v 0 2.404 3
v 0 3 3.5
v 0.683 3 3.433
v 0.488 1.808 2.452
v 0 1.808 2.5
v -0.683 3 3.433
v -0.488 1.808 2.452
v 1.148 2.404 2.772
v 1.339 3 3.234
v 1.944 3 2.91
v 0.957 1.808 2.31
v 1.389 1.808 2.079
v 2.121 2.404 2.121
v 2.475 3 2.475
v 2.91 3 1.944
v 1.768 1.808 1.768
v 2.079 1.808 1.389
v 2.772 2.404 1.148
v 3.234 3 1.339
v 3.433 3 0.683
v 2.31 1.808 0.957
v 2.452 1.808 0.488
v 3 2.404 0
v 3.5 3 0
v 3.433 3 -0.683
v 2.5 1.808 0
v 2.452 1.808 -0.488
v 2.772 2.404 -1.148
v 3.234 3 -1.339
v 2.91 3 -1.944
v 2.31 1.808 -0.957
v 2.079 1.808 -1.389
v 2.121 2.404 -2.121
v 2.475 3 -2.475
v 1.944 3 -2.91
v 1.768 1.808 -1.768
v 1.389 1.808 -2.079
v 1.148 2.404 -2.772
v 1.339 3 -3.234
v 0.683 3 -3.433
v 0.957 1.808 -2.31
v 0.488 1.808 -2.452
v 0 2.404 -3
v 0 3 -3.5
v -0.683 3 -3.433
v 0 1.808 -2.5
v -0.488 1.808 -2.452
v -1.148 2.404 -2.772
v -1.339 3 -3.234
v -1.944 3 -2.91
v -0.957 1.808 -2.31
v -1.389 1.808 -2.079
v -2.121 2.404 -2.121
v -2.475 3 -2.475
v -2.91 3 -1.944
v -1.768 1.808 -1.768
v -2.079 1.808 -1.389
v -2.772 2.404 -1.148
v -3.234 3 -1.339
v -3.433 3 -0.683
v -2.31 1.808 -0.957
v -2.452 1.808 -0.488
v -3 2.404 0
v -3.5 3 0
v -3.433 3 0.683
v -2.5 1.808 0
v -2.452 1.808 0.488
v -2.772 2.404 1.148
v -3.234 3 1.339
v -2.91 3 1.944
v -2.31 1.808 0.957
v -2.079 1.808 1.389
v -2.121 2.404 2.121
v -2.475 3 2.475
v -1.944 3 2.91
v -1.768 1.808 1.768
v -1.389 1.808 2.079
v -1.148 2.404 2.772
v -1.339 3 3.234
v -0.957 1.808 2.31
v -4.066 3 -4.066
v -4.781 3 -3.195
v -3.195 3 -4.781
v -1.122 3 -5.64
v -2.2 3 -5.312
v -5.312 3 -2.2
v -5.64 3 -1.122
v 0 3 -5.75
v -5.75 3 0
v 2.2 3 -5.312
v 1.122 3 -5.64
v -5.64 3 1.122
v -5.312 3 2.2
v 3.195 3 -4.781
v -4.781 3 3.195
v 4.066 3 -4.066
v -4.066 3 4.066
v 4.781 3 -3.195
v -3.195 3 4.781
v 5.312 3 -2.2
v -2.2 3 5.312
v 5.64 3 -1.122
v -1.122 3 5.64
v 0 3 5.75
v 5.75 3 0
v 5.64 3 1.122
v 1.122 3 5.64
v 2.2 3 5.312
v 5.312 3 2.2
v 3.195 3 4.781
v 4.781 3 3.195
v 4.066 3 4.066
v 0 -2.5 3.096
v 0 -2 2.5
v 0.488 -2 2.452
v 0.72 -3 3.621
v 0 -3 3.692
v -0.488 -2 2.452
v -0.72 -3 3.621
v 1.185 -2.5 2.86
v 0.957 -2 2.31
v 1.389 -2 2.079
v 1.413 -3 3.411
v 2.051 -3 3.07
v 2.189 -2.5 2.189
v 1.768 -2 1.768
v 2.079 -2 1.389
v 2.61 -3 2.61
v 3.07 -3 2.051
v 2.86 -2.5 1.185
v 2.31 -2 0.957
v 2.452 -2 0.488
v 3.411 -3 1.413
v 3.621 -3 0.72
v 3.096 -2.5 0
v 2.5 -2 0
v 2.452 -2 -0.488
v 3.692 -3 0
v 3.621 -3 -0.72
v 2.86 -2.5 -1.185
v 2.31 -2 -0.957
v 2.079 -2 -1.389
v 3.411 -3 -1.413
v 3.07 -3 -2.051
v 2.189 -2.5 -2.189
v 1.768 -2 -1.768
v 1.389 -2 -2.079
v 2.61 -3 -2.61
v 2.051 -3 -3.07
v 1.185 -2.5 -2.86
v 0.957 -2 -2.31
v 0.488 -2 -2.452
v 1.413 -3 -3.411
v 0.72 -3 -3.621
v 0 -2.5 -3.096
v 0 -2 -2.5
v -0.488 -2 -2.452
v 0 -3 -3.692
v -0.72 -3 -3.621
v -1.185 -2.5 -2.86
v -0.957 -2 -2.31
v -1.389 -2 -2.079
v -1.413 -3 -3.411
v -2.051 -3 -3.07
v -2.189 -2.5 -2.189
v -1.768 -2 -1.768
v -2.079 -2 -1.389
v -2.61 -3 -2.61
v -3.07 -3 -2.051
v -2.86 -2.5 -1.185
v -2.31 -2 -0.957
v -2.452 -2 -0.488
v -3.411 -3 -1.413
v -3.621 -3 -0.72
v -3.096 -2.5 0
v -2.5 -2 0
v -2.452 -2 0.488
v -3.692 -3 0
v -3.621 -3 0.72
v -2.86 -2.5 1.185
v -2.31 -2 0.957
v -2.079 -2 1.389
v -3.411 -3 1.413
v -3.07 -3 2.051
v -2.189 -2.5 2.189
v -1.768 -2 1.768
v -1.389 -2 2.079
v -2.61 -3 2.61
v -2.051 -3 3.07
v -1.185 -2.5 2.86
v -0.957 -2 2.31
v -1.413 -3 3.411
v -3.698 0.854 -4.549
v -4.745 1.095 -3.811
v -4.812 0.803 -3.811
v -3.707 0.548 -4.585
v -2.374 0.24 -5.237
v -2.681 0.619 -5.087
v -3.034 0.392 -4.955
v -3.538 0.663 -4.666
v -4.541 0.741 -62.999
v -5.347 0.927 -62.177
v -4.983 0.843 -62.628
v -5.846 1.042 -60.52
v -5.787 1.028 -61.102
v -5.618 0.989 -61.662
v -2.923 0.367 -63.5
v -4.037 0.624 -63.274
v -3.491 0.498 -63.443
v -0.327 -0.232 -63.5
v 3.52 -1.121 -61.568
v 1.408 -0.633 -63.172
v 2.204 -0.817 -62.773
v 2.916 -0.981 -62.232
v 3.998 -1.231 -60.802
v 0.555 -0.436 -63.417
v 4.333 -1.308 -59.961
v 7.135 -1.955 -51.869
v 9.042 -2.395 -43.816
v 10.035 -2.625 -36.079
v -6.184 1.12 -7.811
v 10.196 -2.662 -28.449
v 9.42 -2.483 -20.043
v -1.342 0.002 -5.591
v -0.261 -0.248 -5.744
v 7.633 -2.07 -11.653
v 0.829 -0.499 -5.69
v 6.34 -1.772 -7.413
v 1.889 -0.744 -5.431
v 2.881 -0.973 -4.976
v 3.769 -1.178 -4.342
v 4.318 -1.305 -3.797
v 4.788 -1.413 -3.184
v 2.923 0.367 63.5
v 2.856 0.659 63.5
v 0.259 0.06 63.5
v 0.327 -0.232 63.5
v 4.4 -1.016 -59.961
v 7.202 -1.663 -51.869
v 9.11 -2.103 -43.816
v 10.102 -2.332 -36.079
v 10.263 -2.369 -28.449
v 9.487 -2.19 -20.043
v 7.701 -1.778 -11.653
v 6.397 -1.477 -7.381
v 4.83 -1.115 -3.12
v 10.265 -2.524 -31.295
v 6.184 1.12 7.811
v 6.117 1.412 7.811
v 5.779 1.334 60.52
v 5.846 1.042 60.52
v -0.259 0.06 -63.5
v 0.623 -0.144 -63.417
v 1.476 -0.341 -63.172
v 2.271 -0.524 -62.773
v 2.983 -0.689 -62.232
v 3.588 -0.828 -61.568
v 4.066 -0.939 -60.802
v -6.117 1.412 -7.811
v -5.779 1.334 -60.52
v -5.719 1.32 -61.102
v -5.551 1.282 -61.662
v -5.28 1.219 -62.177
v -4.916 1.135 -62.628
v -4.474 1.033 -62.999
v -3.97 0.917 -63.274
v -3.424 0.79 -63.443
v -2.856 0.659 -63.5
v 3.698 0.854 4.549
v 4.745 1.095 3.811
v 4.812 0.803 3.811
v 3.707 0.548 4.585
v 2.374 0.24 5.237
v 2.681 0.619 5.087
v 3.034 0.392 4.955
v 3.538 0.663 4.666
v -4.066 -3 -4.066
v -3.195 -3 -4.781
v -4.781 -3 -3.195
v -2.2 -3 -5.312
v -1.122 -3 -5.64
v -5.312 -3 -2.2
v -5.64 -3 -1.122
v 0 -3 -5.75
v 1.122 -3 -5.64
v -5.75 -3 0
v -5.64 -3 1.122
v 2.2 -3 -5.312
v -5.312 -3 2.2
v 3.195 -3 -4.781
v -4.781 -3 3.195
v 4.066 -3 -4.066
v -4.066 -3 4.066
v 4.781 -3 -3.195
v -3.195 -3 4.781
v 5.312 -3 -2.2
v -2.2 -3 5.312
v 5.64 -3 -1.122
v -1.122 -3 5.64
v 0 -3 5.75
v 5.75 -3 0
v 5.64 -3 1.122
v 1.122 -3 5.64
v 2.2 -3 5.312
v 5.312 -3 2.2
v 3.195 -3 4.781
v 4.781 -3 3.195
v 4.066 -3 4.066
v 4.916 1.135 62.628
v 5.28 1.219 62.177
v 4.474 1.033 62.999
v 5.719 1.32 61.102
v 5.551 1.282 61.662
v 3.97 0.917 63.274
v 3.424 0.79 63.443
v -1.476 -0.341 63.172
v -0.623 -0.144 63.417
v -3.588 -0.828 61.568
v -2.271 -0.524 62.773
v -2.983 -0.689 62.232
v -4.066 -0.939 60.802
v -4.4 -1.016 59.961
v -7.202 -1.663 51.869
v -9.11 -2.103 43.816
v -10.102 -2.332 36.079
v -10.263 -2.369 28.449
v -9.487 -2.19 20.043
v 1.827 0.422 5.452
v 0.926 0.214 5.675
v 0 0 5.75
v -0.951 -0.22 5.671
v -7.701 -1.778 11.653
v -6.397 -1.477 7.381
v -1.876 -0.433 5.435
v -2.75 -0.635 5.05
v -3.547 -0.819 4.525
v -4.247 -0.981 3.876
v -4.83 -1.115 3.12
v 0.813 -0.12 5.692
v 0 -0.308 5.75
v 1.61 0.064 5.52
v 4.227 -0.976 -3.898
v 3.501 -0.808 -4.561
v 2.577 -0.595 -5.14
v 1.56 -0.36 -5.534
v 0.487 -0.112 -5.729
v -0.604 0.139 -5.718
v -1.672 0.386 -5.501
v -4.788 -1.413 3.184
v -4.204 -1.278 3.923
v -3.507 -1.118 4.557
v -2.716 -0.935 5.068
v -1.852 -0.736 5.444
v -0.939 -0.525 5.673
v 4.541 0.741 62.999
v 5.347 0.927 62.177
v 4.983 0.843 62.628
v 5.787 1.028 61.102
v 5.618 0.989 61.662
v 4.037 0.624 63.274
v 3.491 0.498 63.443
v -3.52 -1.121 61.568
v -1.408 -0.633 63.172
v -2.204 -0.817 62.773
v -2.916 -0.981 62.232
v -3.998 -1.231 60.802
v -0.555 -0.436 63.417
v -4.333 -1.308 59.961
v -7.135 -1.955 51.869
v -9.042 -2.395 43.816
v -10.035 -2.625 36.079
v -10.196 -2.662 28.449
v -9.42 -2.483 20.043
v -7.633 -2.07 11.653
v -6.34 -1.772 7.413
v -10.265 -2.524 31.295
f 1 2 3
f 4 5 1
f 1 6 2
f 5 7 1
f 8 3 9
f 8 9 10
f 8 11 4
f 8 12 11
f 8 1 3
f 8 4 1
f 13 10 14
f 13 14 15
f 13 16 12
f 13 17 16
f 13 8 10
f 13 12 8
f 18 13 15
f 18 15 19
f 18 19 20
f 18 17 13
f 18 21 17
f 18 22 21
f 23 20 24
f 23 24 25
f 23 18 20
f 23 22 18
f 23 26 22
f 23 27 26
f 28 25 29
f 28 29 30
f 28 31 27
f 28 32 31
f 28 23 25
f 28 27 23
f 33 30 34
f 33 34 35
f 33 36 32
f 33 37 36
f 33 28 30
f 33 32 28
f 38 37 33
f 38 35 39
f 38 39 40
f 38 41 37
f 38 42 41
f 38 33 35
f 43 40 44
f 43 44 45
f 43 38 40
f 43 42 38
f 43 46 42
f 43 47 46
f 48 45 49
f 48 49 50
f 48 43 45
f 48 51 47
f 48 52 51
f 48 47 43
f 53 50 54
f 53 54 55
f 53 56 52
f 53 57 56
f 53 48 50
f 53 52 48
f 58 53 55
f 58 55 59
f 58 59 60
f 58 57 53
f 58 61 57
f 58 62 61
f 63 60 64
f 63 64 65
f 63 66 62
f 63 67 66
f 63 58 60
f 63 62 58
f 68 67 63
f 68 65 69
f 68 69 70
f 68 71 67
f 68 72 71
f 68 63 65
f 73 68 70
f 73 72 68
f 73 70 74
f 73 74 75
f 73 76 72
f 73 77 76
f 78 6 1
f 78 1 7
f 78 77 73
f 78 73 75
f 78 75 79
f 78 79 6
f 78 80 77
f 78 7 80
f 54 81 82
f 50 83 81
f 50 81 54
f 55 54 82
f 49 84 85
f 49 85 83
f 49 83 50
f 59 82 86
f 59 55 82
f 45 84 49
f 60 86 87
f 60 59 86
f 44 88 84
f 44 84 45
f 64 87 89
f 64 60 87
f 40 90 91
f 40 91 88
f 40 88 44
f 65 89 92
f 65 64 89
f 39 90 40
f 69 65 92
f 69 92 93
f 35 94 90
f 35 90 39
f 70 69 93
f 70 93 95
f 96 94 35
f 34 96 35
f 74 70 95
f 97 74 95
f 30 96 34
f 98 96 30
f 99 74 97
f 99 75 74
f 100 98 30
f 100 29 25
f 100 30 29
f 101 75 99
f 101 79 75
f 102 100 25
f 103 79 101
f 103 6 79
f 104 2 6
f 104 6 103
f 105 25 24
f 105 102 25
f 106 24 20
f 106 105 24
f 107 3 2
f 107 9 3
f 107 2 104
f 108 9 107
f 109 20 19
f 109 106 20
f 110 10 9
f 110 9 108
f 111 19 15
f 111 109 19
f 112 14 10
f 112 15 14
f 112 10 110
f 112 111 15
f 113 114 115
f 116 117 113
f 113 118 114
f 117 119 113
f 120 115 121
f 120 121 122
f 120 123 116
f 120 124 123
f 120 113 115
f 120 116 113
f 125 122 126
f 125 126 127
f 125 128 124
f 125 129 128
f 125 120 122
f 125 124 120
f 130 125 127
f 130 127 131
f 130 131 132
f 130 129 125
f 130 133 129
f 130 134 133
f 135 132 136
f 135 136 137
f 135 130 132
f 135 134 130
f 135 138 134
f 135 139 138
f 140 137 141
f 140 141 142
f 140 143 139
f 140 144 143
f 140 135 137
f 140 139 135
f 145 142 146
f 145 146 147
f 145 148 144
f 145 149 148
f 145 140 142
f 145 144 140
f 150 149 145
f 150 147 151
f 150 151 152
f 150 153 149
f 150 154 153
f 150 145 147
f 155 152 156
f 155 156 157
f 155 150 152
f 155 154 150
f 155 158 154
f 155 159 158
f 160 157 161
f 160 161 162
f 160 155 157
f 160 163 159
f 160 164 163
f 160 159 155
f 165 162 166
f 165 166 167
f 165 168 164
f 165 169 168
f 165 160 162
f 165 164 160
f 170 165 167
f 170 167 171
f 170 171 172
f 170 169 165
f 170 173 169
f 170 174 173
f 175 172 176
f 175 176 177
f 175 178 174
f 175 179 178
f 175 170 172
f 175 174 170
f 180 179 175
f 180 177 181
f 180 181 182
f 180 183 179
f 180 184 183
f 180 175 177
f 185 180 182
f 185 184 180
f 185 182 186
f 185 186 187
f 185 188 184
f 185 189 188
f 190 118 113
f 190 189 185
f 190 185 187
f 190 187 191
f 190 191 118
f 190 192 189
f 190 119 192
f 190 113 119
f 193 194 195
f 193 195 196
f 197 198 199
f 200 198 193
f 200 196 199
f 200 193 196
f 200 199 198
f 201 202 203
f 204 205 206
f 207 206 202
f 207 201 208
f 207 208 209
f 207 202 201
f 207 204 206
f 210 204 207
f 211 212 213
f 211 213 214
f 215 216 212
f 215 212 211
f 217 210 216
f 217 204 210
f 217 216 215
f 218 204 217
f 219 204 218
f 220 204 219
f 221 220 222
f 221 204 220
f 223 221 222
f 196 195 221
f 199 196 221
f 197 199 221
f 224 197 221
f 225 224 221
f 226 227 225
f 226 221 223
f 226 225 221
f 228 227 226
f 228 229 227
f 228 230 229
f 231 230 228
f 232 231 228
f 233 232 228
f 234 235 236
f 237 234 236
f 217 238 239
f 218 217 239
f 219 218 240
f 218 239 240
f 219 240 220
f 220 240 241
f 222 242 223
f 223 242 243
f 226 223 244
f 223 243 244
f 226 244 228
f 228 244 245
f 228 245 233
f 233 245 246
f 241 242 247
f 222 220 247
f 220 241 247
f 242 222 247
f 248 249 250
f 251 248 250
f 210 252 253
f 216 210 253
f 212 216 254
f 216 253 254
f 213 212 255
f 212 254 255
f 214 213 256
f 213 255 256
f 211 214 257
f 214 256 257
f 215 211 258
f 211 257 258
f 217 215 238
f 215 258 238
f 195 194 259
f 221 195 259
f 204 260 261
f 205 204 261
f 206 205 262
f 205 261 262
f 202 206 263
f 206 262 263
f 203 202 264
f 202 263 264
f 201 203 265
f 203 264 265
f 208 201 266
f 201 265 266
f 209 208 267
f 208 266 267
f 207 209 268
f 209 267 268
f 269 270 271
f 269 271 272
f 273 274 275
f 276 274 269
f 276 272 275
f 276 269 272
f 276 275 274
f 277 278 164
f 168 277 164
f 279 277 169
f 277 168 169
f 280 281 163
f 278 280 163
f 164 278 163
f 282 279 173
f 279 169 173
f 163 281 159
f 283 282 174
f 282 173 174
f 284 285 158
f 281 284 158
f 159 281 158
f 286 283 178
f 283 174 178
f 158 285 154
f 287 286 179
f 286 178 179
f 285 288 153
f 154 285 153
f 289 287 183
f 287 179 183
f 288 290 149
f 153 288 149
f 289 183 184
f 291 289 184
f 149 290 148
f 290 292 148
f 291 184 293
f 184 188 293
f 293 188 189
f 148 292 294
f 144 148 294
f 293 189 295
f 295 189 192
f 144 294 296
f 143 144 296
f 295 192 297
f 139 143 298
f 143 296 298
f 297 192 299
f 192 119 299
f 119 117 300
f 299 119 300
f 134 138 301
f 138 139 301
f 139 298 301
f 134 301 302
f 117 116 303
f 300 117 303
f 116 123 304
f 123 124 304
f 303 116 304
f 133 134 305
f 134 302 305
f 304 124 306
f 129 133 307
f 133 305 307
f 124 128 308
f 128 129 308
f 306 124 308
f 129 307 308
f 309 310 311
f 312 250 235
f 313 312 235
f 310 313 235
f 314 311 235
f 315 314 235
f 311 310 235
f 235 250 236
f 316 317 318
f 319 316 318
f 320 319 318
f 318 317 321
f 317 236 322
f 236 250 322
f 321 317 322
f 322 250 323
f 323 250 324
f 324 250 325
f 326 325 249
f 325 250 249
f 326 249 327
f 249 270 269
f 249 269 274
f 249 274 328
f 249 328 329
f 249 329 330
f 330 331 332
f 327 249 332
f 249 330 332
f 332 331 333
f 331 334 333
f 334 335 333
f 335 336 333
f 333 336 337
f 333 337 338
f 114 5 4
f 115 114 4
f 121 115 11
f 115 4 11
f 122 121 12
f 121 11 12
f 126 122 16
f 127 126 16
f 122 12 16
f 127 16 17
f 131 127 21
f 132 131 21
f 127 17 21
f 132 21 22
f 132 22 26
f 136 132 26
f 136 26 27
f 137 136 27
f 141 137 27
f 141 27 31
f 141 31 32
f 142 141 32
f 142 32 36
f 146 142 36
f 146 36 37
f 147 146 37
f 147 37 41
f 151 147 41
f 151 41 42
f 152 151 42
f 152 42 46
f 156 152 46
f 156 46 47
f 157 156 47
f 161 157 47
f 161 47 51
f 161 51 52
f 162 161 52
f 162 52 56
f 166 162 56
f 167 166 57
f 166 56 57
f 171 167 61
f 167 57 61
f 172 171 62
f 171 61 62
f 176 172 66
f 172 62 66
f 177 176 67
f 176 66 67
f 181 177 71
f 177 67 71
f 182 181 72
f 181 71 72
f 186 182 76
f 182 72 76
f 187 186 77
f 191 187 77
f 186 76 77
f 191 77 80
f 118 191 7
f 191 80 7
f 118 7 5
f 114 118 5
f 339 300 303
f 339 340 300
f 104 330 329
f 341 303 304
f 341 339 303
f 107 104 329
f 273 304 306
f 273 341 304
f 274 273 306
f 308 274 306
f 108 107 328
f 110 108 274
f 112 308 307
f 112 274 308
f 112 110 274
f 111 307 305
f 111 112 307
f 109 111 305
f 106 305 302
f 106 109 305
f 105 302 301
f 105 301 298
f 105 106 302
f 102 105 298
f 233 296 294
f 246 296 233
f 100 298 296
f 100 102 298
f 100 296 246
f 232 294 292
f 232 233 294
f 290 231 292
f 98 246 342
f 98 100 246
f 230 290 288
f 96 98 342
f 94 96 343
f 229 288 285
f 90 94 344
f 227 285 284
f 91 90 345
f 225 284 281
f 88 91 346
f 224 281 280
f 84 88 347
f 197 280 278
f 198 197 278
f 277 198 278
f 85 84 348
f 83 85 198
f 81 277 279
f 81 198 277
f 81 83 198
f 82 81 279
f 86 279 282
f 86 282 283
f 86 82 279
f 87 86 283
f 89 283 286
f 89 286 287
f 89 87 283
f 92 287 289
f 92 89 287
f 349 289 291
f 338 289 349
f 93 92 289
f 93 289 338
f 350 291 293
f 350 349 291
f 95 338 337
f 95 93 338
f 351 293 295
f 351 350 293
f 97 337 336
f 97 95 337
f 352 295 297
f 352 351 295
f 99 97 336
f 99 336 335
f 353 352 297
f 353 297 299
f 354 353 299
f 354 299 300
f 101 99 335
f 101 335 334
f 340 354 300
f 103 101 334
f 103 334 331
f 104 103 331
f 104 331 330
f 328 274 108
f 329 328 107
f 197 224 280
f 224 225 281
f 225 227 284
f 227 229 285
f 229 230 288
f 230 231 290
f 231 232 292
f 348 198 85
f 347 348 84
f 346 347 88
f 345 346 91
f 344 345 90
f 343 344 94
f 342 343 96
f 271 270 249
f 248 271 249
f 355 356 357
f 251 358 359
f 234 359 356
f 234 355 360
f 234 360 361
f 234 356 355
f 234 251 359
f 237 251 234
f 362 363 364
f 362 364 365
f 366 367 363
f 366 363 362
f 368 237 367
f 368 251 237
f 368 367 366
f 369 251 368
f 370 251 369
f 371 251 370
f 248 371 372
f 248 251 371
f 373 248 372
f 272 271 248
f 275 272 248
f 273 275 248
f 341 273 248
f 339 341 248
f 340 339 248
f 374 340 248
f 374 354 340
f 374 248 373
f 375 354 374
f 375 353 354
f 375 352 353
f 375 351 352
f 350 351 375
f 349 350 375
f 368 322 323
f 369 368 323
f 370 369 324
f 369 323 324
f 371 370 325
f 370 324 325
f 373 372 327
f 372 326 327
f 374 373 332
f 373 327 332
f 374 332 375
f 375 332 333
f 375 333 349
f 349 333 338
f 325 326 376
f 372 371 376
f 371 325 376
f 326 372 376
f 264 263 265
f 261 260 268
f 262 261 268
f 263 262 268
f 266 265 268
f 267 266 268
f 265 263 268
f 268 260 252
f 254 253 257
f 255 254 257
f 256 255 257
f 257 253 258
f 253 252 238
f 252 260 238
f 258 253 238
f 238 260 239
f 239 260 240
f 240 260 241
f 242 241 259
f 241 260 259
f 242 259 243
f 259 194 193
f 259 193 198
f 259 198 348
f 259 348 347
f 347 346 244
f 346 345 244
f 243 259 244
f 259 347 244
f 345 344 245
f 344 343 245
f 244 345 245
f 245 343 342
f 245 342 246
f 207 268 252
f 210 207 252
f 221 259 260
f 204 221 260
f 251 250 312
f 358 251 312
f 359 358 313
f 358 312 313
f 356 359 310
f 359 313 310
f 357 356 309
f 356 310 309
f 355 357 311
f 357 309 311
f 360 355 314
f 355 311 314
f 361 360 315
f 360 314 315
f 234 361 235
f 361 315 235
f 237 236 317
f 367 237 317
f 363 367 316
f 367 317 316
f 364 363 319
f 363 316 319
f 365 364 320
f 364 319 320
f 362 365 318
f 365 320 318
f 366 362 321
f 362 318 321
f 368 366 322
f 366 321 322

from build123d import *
from OCP.BRepFilletAPI import BRepFilletAPI_MakeChamfer

# Parameters (mm, degrees)
SKETCH1_R           = 5.75
BOSS_EXTRUDE1_DEPTH = 3
BOSS_EXTRUDE3_DEPTH = 0.3
CIRPATTERN1_COUNT   = 2
SKETCH4_R           = 2.5
CUT_EXTRUDE1_DEPTH  = 65.609278472
CHAMFER1_SIZE       = 1
CHAMFER1_SIZE2      = 1.191753593


with BuildPart() as part:
    # Sketch1 → Boss-Extrude1 (new, symmetric)
    with BuildSketch(Plane(origin=(0, 0, 0), x_dir=(1, 0, 0), z_dir=(0, 1, 0))):
        with Locations(Location((0, 0, 0), (0, 0, 270))):
            Circle(SKETCH1_R)
    extrude(amount=BOSS_EXTRUDE1_DEPTH, both=True)

    # Sketch3 → Boss-Extrude3 (add)
    with BuildSketch(Plane(origin=(0, 0, 0), x_dir=(0.9743700647852351, -0.22495105434386534, 0), z_dir=(-0.22495105434386534, -0.9743700647852351, 0))):
        with BuildLine():
            Line((-4.869810272, -3.811414063), (-6.277481036, -7.811414063))
            Line((-6.277481036, -7.811414063), (-5.9307932, -60.519732009))
            ThreePointArc((-5.9307932, -60.519732009), (-5.045190608, -62.628285228), (-2.930858092, -63.5))
            Line((-2.930858092, -63.5), (-0.266005483, -63.5))
            ThreePointArc((-0.266005483, -63.5), (2.708645134, -62.518887124), (4.515908541, -59.960581485))
            add(Edge.make_bspline(
                [(4.515908541, -59.960581485), (16.627834102, -30.503690424), (4.515908541, -2.064662287)],
                knots=[0, 0, 0, 1, 1, 1], degree=2))
            add(Edge.make_bspline(
                [(-4.869810272, -3.811414063), (0.634471784, -8.039563779), (4.515908541, -2.064662287)],
                knots=[0, 0, 0, 1, 1, 1], degree=2))
        make_face()
    boss_extrude3 = extrude(amount=BOSS_EXTRUDE3_DEPTH)

    # CirPattern1: Boss-Extrude3 ×2 about axis
    cirpattern1_axis = Axis((0, 3, 0), (0, -1, 0))
    for i in range(1, CIRPATTERN1_COUNT):
        add(boss_extrude3.rotate(cirpattern1_axis, i * 360 / CIRPATTERN1_COUNT))

    # Sketch4 → Cut-Extrude1 (cut, through all)
    with BuildSketch(Plane(origin=(0, 3, 0), x_dir=(1, 0, 0), z_dir=(0, 1, 0))):
        with Locations(Location((0, 0, 0), (0, 0, 270))):
            Circle(SKETCH4_R)
    extrude(amount=-CUT_EXTRUDE1_DEPTH, mode=Mode.SUBTRACT)

    # Chamfer1: one chamfer whose edges measure the first distance from different faces: ONE call of the kernel's chamfer builder (chamfer() names one face for all edges)
    chamfer1_edges_1 = [part.edges().sort_by_distance(p)[0] for p in [
        (0, -3, -2.5),
    ]]
    chamfer1_side_1 = [part.faces().sort_by_distance(p)[0] for p in [
        (0, 0, -2.5),
    ]]
    chamfer1_edges_2 = [part.edges().sort_by_distance(p)[0] for p in [
        (0, 3, -2.5),
    ]]
    chamfer1_side_2 = [part.faces().sort_by_distance(p)[0] for p in [
        (0, 3, -5.58736544),
    ]]
    chamfer1 = BRepFilletAPI_MakeChamfer(part.part.solid().wrapped)
    for e in chamfer1_edges_1:
        chamfer1.Add(CHAMFER1_SIZE, CHAMFER1_SIZE2, e.wrapped, chamfer1_side_1[0].wrapped)  # the first distance lies on this face
    for e in chamfer1_edges_2:
        chamfer1.Add(CHAMFER1_SIZE, CHAMFER1_SIZE2, e.wrapped, chamfer1_side_2[0].wrapped)  # the first distance lies on this face
    add(Compound.cast(chamfer1.Shape()), mode=Mode.REPLACE)


solid = part.part
